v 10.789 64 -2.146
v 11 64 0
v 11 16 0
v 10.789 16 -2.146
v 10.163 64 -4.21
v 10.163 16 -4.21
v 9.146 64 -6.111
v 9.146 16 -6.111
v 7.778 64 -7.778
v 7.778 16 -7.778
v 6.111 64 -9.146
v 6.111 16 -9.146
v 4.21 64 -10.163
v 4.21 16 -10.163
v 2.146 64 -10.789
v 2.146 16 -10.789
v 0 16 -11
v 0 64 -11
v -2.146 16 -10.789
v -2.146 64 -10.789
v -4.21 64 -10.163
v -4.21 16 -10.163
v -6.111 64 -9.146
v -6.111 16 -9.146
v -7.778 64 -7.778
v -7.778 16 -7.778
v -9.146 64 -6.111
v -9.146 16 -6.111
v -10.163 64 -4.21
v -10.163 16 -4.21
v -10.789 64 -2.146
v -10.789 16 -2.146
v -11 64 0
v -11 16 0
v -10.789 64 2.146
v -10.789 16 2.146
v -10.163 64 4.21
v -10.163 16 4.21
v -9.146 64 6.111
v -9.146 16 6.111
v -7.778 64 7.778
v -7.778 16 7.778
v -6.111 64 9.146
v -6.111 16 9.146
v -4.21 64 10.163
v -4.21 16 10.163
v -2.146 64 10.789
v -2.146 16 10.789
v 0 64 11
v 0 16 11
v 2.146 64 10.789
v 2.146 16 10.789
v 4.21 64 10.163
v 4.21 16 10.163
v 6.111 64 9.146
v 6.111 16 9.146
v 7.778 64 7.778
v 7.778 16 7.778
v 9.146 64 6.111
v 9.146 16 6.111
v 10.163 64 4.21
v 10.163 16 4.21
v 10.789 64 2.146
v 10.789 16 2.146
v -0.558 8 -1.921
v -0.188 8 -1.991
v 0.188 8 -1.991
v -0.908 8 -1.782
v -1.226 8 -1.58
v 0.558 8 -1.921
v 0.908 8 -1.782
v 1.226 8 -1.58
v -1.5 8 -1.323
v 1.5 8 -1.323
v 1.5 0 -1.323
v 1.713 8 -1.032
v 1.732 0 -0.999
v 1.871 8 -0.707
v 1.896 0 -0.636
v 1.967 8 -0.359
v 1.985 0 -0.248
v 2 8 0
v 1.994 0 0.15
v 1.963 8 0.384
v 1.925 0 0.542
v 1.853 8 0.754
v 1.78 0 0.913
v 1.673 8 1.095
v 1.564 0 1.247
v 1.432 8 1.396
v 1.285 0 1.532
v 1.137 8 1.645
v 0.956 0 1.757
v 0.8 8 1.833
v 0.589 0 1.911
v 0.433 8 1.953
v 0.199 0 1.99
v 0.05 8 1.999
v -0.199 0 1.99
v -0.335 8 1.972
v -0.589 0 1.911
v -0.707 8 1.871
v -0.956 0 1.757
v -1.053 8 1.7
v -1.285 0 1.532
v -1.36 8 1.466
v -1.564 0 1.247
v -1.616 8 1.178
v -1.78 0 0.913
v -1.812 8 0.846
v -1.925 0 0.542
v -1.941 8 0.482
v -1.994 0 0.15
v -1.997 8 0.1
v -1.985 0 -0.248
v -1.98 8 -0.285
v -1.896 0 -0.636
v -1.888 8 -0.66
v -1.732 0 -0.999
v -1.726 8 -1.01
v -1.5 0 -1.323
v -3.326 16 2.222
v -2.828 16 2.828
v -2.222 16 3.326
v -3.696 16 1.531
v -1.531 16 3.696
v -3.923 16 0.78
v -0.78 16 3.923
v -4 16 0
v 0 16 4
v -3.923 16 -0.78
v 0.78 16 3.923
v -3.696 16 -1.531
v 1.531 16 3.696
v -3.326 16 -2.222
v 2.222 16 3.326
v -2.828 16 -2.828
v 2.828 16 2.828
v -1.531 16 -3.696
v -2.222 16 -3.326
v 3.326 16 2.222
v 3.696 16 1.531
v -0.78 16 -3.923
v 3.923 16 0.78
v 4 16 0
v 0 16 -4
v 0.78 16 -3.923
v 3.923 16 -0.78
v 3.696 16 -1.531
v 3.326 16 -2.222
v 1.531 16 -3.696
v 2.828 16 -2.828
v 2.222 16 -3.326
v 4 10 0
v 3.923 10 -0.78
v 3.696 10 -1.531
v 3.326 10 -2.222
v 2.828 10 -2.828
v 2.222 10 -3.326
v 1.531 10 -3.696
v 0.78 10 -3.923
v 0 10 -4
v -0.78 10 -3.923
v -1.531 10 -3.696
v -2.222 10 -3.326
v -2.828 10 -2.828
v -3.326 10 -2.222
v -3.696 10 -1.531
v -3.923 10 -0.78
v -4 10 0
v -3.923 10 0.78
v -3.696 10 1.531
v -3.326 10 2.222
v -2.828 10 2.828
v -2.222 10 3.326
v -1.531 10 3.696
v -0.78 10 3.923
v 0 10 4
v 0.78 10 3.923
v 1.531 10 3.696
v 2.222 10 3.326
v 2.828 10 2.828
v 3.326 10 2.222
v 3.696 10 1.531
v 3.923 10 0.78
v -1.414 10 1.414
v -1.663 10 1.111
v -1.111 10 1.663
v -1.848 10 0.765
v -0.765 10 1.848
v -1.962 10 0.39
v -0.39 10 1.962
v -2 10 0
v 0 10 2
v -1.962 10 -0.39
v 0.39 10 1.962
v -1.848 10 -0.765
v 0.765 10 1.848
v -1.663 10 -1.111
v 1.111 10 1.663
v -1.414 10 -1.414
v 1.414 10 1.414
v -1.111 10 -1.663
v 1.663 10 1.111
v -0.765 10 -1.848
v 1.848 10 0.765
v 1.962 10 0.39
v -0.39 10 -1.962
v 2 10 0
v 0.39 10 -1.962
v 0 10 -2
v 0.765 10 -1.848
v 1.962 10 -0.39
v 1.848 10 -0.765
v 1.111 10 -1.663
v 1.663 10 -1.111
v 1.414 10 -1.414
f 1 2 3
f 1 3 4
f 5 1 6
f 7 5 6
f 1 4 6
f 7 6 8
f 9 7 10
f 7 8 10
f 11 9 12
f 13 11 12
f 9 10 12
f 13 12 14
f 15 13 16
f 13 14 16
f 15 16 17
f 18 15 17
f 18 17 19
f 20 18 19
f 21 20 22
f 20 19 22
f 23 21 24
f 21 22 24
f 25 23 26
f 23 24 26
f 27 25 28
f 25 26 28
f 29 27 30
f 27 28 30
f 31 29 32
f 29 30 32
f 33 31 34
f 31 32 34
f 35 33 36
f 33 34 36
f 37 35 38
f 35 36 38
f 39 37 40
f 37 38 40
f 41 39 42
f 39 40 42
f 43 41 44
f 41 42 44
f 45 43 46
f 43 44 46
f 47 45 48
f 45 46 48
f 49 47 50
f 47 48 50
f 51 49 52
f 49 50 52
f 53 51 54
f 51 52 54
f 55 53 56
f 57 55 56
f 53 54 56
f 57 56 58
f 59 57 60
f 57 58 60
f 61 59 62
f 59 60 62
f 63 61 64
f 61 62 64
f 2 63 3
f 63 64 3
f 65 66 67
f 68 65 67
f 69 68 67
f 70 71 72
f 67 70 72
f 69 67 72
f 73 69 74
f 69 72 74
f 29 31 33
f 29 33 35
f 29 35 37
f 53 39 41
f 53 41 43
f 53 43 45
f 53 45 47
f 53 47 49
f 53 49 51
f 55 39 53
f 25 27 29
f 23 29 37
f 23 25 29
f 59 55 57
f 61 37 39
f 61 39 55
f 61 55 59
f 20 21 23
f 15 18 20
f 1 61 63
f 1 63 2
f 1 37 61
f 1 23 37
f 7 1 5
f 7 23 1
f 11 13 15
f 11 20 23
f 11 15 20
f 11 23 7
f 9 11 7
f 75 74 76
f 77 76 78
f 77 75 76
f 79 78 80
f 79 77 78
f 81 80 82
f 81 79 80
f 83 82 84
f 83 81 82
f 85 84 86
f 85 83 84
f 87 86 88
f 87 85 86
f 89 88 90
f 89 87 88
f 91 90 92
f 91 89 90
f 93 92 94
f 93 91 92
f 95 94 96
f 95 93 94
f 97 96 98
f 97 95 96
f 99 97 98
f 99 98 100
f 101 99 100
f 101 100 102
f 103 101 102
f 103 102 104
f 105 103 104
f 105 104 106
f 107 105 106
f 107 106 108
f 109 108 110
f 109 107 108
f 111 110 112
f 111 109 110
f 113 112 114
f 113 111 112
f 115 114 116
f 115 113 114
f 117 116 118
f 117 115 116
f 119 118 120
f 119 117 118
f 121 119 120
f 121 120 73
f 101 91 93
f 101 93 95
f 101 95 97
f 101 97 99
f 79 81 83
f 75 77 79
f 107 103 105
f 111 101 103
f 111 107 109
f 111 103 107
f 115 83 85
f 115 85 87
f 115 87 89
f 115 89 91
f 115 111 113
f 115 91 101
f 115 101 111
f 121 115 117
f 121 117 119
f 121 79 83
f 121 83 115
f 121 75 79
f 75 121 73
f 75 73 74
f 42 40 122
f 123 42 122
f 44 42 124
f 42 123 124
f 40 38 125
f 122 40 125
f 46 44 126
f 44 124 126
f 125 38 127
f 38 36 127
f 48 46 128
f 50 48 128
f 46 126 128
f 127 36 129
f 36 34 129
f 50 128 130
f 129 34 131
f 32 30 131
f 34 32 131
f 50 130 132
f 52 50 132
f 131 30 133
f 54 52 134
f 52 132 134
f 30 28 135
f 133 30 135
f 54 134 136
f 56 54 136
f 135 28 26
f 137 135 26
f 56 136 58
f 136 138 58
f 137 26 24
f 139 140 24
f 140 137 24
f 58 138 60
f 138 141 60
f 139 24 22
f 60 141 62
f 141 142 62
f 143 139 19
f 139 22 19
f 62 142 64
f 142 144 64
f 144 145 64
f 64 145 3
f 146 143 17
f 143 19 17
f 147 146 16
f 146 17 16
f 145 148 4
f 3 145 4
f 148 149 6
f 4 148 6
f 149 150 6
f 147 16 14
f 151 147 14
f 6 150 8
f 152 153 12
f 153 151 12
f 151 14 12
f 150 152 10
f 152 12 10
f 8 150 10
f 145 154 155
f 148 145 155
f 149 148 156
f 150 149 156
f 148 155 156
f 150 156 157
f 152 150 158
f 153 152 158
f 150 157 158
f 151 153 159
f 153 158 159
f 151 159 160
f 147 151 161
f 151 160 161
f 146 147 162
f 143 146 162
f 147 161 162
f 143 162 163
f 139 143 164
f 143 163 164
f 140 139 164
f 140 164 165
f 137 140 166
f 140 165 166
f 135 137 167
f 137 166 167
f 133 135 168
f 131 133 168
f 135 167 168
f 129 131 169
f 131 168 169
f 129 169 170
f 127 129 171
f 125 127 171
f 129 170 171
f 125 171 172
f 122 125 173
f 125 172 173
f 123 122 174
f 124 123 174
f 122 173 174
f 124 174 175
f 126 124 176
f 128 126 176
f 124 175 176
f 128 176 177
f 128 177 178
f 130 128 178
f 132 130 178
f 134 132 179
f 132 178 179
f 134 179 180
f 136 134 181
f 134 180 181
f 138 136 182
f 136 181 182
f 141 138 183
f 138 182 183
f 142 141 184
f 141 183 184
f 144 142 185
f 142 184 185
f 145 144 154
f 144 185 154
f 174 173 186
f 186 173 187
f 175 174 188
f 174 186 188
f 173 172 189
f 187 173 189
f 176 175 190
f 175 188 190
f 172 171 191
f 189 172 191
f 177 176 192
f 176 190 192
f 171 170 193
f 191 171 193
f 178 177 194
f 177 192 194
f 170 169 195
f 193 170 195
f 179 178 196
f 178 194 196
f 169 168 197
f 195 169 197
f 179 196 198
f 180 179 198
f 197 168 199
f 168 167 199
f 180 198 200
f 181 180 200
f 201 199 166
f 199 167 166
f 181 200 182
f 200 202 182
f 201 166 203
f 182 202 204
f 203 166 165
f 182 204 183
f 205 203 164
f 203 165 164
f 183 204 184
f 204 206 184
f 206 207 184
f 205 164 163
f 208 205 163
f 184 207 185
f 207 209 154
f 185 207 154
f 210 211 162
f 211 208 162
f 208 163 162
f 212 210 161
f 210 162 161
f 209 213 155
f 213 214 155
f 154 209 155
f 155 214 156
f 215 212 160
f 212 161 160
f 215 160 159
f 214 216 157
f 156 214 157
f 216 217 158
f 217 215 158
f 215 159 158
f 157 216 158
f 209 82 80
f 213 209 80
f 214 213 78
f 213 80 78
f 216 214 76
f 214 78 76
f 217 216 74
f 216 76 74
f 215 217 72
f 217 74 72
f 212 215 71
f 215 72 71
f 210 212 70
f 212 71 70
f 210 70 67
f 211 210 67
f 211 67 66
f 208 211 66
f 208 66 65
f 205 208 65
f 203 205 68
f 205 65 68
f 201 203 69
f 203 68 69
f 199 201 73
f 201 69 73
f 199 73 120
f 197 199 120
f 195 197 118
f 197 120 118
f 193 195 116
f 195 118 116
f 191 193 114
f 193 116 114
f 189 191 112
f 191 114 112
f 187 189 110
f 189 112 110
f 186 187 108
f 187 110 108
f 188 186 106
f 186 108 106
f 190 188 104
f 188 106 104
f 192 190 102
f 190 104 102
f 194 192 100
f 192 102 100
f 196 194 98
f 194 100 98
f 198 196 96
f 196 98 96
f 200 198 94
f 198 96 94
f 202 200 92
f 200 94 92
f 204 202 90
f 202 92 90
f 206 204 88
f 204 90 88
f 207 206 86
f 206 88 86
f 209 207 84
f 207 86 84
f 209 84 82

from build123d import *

# Parameters (mm, degrees)
BOSS_EXTRUDE1_DEPTH = 8
SKETCH2_R           = 2
BOSS_EXTRUDE2_DEPTH = 2
SKETCH3_R           = 4
BOSS_EXTRUDE3_DEPTH = 6
SKETCH4_R           = 11
BOSS_EXTRUDE4_DEPTH = 48


with BuildPart() as part:
    # Sketch1 → Boss-Extrude1 (new body)
    with BuildSketch(Plane(origin=(0, 0, 0), x_dir=(1, 0, 0), z_dir=(0, 1, 0))):
        with BuildLine():
            Line((-1.5, 1.322875656), (1.5, 1.322875656))
            ThreePointArc((1.5, 1.322875656), (0, -2), (-1.5, 1.322875656))
        make_face()
    extrude(amount=BOSS_EXTRUDE1_DEPTH)

    # Sketch2 → Boss-Extrude2 (add)
    with BuildSketch(Plane(origin=(0, 8, 0), x_dir=(1, 0, 0), z_dir=(0, 1, 0))):
        Circle(SKETCH2_R)
    extrude(amount=BOSS_EXTRUDE2_DEPTH)

    # Sketch3 → Boss-Extrude3 (add)
    with BuildSketch(Plane(origin=(0, 10, 0), x_dir=(1, 0, 0), z_dir=(0, 1, 0))):
        Circle(SKETCH3_R)
    extrude(amount=BOSS_EXTRUDE3_DEPTH)

    # Sketch4 → Boss-Extrude4 (add)
    with BuildSketch(Plane(origin=(0, 16, 0), x_dir=(1, 0, 0), z_dir=(0, 1, 0))):
        Circle(SKETCH4_R)
    extrude(amount=BOSS_EXTRUDE4_DEPTH)


solid = part.part
